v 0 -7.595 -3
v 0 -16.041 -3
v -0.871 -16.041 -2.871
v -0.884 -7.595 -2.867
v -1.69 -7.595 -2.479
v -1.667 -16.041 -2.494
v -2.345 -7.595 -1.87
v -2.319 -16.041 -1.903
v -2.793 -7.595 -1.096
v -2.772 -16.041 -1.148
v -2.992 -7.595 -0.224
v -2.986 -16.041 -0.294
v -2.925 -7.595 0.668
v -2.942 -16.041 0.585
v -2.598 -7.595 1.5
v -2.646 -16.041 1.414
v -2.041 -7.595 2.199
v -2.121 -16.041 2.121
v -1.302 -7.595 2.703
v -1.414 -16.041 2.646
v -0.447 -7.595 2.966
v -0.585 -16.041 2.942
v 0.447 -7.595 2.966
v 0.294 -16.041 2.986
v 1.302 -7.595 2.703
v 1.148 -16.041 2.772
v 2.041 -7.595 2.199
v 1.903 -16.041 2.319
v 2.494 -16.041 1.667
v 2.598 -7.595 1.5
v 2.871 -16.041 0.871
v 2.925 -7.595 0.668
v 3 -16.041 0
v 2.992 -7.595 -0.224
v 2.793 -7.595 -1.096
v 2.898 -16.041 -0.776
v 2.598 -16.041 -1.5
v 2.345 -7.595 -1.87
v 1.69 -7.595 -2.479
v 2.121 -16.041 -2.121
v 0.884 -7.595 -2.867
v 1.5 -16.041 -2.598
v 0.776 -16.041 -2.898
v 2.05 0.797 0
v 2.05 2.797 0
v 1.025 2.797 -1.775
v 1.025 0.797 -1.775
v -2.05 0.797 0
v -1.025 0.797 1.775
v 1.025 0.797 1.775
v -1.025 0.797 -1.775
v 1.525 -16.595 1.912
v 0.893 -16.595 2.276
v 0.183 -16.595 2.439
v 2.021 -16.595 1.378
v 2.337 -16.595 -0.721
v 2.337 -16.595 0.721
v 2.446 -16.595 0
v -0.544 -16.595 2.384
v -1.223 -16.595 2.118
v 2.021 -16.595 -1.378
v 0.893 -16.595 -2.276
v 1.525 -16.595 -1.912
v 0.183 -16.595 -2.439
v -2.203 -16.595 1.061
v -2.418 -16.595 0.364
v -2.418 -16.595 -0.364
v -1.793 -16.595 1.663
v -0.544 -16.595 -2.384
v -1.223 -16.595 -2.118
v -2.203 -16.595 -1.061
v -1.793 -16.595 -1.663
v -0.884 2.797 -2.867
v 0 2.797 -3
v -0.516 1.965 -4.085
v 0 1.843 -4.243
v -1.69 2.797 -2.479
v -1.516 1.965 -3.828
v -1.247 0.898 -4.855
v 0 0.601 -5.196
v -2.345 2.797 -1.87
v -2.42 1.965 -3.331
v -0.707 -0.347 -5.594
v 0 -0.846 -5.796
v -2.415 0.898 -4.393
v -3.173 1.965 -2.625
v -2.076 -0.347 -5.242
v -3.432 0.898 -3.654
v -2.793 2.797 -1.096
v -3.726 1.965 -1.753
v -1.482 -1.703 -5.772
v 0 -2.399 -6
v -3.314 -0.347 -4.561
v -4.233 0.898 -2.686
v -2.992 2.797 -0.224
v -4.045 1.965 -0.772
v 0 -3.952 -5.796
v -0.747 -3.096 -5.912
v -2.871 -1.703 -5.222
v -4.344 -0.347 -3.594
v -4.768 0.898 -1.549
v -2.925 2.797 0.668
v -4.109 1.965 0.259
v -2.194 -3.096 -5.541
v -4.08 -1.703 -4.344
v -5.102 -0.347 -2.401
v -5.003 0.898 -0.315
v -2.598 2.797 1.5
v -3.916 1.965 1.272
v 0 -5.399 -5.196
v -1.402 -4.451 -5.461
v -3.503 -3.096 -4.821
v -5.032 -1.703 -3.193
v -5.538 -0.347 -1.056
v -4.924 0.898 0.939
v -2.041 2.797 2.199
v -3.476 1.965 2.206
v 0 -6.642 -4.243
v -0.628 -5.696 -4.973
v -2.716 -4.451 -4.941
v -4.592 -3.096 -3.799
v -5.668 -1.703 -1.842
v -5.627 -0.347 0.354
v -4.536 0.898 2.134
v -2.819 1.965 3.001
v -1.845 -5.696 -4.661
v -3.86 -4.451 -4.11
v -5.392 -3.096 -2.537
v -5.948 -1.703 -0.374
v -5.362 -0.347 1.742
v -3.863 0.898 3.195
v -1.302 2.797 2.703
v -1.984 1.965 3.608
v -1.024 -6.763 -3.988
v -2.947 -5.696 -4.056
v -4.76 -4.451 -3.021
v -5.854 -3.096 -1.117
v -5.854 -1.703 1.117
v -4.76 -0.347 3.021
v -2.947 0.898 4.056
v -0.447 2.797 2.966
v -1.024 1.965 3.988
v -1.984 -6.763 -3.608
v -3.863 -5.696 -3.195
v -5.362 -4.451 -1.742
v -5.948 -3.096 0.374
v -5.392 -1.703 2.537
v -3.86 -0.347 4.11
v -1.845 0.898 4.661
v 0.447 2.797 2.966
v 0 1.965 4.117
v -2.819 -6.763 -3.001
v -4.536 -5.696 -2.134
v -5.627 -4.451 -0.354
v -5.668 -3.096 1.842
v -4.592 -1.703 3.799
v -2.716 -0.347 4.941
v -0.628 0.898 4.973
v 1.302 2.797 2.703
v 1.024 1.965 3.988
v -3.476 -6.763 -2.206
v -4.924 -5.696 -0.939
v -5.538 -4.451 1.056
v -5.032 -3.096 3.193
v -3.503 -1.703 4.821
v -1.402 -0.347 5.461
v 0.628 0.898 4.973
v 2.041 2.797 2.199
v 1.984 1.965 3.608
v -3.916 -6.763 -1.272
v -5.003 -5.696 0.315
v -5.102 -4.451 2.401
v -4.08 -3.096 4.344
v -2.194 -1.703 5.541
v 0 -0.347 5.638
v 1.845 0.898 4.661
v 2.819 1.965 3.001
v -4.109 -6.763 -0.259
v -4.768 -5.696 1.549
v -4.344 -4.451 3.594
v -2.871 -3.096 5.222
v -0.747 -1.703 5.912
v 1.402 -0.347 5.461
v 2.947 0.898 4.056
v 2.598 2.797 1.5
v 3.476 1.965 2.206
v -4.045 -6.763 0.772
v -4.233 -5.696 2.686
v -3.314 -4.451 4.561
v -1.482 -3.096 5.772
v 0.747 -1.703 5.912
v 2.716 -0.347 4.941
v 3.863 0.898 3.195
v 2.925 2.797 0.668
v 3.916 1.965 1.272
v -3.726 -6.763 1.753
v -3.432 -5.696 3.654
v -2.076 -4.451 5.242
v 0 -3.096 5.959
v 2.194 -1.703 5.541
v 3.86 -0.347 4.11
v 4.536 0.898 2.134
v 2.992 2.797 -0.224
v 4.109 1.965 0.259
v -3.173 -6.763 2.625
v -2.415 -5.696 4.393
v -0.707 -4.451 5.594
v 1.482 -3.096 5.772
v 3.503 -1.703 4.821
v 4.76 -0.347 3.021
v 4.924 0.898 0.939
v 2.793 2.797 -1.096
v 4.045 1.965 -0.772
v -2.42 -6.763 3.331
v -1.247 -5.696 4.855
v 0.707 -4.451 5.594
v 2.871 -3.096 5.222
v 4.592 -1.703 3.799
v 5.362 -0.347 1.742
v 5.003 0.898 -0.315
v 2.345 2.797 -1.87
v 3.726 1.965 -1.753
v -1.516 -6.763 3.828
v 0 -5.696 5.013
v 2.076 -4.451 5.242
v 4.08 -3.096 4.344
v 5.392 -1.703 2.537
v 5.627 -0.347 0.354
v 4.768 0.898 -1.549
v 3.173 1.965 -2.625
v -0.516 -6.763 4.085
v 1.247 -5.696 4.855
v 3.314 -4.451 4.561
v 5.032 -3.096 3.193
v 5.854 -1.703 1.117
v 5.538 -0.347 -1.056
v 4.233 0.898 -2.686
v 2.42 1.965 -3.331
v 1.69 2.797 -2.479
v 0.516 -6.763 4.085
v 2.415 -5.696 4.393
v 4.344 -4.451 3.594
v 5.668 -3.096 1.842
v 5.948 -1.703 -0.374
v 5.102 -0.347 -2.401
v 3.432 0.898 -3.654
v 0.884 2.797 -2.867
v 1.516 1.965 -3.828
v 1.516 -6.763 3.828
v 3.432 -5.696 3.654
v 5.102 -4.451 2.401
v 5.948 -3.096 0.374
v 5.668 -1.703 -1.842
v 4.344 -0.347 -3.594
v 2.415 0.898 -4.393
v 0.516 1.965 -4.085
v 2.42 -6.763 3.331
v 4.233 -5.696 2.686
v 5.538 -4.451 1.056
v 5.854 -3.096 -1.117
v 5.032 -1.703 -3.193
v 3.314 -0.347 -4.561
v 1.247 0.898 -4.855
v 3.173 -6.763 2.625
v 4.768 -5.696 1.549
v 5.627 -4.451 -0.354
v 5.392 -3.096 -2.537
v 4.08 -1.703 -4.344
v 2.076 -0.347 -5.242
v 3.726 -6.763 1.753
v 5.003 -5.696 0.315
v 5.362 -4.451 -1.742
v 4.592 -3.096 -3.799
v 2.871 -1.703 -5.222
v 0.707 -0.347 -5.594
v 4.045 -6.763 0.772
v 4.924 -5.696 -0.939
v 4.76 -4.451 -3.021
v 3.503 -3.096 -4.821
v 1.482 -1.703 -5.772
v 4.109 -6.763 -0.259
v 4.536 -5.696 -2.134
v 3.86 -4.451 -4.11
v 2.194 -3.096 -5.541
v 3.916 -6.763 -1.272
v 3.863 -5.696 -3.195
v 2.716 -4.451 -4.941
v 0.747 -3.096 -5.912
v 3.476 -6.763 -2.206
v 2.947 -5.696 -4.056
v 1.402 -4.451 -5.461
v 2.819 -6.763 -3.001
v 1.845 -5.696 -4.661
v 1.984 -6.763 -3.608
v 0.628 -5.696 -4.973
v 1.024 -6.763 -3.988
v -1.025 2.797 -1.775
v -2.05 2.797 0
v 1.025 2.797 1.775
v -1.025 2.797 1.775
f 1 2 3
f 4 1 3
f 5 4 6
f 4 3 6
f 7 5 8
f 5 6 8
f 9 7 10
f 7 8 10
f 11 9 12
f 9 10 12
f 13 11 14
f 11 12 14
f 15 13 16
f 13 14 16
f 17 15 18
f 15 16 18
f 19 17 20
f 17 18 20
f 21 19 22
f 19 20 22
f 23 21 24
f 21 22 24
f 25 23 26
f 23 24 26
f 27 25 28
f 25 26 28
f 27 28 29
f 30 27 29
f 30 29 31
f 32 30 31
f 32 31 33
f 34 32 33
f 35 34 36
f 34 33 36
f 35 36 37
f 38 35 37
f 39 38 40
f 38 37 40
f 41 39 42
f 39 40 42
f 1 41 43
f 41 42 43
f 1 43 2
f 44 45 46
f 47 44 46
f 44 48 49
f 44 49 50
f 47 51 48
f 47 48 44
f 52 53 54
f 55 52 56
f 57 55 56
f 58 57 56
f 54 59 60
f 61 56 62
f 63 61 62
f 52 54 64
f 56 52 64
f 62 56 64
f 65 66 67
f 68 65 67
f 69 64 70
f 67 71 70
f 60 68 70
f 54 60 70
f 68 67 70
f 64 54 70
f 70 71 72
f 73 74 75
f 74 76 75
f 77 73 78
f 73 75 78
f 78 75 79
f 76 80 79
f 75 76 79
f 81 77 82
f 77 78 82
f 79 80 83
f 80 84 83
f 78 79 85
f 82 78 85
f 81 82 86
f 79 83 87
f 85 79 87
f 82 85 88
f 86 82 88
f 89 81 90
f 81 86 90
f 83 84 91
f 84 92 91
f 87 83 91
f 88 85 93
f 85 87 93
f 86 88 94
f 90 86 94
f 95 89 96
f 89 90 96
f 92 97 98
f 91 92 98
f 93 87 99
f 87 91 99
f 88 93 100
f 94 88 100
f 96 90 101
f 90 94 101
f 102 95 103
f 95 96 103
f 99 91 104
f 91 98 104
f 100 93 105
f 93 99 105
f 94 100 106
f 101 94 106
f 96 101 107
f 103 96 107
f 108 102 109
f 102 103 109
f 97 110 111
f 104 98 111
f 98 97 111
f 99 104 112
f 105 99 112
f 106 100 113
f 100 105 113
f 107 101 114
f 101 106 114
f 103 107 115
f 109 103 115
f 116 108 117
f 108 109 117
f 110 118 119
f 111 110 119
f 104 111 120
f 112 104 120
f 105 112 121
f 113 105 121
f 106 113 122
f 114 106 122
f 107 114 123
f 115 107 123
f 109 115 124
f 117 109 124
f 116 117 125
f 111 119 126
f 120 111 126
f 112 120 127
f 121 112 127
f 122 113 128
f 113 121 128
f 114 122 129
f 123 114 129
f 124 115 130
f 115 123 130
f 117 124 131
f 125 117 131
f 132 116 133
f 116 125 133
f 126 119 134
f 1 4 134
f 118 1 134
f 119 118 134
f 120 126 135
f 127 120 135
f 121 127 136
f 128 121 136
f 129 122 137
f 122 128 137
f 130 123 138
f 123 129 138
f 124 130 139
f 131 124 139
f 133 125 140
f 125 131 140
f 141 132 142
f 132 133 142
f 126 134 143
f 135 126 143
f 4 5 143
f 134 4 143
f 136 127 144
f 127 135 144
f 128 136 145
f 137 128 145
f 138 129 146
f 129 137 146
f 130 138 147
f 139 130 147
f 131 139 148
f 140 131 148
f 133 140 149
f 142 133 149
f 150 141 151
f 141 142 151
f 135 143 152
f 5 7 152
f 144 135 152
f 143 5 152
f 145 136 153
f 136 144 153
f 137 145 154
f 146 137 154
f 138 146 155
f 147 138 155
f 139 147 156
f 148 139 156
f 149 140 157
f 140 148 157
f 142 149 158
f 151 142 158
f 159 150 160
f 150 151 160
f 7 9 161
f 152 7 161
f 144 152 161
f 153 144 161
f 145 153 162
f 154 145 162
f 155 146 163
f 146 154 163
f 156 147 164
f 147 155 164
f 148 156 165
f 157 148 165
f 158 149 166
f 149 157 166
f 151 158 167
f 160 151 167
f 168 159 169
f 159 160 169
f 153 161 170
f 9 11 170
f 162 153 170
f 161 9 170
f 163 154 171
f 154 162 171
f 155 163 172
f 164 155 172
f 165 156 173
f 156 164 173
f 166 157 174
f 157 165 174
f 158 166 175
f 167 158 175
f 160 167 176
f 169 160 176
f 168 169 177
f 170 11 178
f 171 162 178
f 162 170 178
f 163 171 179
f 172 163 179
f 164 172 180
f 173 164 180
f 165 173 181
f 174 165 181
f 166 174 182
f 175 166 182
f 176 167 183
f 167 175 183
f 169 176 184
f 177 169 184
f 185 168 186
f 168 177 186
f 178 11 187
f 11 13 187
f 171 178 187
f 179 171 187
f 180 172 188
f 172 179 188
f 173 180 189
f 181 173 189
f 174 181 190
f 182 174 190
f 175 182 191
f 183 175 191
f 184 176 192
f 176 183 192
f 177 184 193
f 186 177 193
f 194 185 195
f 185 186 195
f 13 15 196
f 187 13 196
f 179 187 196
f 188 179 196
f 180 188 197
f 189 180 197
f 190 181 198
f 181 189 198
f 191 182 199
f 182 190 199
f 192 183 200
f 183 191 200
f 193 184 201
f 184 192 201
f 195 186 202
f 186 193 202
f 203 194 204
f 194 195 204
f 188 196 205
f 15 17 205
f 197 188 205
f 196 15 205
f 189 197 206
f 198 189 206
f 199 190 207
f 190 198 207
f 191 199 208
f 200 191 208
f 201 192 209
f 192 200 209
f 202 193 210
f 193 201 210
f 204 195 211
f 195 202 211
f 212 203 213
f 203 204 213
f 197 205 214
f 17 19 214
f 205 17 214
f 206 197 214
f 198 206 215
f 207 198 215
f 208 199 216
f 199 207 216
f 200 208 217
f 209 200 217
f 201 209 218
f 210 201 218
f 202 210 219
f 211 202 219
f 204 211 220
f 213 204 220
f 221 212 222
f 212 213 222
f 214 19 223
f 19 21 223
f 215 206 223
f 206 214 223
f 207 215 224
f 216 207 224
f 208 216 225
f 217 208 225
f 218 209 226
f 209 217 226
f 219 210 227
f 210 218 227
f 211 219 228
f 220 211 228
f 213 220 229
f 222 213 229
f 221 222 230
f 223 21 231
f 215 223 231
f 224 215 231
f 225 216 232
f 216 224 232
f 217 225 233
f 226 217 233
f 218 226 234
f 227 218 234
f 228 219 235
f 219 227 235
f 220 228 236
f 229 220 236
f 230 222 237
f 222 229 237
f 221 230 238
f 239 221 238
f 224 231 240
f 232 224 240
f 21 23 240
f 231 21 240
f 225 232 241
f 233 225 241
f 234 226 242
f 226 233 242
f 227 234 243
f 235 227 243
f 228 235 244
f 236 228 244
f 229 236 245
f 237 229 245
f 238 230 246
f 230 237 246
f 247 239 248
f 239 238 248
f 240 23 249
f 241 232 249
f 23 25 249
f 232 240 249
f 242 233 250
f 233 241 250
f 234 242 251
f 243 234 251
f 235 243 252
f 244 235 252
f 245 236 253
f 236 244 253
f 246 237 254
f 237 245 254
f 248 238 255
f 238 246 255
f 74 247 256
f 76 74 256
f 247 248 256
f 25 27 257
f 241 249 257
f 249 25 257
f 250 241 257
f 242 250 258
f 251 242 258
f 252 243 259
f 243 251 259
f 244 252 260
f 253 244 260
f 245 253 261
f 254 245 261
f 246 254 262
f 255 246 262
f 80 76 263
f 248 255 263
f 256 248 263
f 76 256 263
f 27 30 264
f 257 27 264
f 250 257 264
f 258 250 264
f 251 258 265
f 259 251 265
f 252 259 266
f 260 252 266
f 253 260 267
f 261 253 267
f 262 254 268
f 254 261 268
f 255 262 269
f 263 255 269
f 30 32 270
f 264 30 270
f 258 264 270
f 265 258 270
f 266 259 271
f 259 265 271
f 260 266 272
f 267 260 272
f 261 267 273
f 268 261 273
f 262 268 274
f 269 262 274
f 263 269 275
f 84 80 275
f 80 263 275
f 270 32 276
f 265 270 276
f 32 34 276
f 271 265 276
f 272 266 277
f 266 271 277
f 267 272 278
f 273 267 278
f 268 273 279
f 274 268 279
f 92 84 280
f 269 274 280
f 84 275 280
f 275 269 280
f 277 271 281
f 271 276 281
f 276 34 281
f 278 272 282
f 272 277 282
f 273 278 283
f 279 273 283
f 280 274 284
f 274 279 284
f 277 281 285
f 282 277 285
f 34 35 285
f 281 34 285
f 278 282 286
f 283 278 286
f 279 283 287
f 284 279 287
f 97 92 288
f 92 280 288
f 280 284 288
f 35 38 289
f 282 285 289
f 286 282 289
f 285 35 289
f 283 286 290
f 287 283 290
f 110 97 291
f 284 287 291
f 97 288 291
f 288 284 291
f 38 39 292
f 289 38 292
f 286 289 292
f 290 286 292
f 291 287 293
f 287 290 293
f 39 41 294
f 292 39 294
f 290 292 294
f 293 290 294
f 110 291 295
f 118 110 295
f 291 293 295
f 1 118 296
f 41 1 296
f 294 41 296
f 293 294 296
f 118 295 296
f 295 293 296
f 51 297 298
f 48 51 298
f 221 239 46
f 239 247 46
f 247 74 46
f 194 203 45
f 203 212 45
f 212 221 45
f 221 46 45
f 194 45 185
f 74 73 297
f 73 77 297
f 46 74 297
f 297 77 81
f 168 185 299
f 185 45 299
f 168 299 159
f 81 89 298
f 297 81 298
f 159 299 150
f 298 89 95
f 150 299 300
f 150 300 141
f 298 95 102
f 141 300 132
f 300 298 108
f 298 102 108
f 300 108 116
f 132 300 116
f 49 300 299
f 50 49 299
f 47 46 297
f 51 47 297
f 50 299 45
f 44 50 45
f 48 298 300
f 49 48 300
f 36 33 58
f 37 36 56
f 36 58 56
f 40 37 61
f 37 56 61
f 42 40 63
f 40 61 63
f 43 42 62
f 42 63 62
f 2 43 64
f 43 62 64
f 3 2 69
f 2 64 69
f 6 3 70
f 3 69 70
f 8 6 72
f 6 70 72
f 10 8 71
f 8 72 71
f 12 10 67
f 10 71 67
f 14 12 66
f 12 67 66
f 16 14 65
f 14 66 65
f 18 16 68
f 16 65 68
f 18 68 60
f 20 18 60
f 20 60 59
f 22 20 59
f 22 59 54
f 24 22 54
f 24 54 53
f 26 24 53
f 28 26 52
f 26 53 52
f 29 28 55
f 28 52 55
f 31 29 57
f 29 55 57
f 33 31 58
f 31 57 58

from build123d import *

# Parameters (mm, degrees)
CUT_EXTRUDE1_DEPTH = 2


# Read off the part's stored shape, not the designer's step: M6x1.0 Machine Threads Stud1
with BuildPart() as part:
    # Sketch1 → Revolve1 (revolve)
    with BuildSketch(Plane.XY, mode=Mode.PRIVATE) as revolve1_sk:
        with BuildLine():
            Line((0, -16.59536458), (0, 2.796940265))
            Line((0, 2.796940265), (3, 2.796940265))
            ThreePointArc((3, 2.796940265), (6, -2.399212157), (3, -7.59536458))
            Line((3, -7.59536458), (3, -16.59536458))
            Line((3, -16.59536458), (0, -16.59536458))
        make_face()
    revolve(revolve1_sk.sketch.rotate(Axis((0, -16.59536458, 0), (0, 1, 0)), 90), axis=Axis((0, -16.59536458, 0), (0, 1, 0)))

    # Sketch4 → Cut-Extrude1 (cut)
    with BuildSketch(Plane(origin=(0, 2.796940265, 0), x_dir=(1, 0, 0), z_dir=(0, 1, 0))):
        Polygon((-2.05, 0), (-1.025, -1.775352078), (1.025, -1.775352078), (2.05, 0), (1.025, 1.775352078), (-1.025, 1.775352078), align=None)
    extrude(amount=-CUT_EXTRUDE1_DEPTH, mode=Mode.SUBTRACT)

    # M6x1.0 Machine Threads Stud1 outline → M6x1.0 Machine Threads Stud1 (revolve, cut)
    with BuildSketch(Plane.XY):
        Polygon((3, -16.04086458), (2.4455, -16.59536458), (3, -16.59536458), align=None)
    revolve(axis=Axis((0, 0, 0), (0, 1, 0)), mode=Mode.SUBTRACT)


solid = part.part
